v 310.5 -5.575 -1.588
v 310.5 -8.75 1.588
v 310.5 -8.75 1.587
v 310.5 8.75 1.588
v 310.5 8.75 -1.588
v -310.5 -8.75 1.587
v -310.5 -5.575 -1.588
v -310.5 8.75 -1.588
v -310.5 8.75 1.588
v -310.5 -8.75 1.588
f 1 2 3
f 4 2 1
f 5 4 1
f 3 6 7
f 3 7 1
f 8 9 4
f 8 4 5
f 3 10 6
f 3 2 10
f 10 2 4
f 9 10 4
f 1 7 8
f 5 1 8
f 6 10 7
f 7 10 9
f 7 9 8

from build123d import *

# Parameters (mm, degrees)
SKETCH1_W           = 3.175
SKETCH1_H           = 17.5
BOSS_EXTRUDE1_DEPTH = 310.5
CHAMFER1_SIZE       = 3.175


with BuildPart() as part:
    # Sketch1 → Boss-Extrude1 (new, symmetric)
    with BuildSketch(Plane(origin=(0, 0, 0), x_dir=(0, 0, -1), z_dir=(1, 0, 0))):
        Rectangle(SKETCH1_W, SKETCH1_H)
    extrude(amount=BOSS_EXTRUDE1_DEPTH, both=True)

    # Chamfer1
    chamfer1_edges = [part.edges().sort_by_distance(p)[0] for p in [
        (0, -8.75, -1.5875),
    ]]
    chamfer(chamfer1_edges, length=CHAMFER1_SIZE - 0.0001)  # a hair under: the kernel refuses the full size


solid = part.part
